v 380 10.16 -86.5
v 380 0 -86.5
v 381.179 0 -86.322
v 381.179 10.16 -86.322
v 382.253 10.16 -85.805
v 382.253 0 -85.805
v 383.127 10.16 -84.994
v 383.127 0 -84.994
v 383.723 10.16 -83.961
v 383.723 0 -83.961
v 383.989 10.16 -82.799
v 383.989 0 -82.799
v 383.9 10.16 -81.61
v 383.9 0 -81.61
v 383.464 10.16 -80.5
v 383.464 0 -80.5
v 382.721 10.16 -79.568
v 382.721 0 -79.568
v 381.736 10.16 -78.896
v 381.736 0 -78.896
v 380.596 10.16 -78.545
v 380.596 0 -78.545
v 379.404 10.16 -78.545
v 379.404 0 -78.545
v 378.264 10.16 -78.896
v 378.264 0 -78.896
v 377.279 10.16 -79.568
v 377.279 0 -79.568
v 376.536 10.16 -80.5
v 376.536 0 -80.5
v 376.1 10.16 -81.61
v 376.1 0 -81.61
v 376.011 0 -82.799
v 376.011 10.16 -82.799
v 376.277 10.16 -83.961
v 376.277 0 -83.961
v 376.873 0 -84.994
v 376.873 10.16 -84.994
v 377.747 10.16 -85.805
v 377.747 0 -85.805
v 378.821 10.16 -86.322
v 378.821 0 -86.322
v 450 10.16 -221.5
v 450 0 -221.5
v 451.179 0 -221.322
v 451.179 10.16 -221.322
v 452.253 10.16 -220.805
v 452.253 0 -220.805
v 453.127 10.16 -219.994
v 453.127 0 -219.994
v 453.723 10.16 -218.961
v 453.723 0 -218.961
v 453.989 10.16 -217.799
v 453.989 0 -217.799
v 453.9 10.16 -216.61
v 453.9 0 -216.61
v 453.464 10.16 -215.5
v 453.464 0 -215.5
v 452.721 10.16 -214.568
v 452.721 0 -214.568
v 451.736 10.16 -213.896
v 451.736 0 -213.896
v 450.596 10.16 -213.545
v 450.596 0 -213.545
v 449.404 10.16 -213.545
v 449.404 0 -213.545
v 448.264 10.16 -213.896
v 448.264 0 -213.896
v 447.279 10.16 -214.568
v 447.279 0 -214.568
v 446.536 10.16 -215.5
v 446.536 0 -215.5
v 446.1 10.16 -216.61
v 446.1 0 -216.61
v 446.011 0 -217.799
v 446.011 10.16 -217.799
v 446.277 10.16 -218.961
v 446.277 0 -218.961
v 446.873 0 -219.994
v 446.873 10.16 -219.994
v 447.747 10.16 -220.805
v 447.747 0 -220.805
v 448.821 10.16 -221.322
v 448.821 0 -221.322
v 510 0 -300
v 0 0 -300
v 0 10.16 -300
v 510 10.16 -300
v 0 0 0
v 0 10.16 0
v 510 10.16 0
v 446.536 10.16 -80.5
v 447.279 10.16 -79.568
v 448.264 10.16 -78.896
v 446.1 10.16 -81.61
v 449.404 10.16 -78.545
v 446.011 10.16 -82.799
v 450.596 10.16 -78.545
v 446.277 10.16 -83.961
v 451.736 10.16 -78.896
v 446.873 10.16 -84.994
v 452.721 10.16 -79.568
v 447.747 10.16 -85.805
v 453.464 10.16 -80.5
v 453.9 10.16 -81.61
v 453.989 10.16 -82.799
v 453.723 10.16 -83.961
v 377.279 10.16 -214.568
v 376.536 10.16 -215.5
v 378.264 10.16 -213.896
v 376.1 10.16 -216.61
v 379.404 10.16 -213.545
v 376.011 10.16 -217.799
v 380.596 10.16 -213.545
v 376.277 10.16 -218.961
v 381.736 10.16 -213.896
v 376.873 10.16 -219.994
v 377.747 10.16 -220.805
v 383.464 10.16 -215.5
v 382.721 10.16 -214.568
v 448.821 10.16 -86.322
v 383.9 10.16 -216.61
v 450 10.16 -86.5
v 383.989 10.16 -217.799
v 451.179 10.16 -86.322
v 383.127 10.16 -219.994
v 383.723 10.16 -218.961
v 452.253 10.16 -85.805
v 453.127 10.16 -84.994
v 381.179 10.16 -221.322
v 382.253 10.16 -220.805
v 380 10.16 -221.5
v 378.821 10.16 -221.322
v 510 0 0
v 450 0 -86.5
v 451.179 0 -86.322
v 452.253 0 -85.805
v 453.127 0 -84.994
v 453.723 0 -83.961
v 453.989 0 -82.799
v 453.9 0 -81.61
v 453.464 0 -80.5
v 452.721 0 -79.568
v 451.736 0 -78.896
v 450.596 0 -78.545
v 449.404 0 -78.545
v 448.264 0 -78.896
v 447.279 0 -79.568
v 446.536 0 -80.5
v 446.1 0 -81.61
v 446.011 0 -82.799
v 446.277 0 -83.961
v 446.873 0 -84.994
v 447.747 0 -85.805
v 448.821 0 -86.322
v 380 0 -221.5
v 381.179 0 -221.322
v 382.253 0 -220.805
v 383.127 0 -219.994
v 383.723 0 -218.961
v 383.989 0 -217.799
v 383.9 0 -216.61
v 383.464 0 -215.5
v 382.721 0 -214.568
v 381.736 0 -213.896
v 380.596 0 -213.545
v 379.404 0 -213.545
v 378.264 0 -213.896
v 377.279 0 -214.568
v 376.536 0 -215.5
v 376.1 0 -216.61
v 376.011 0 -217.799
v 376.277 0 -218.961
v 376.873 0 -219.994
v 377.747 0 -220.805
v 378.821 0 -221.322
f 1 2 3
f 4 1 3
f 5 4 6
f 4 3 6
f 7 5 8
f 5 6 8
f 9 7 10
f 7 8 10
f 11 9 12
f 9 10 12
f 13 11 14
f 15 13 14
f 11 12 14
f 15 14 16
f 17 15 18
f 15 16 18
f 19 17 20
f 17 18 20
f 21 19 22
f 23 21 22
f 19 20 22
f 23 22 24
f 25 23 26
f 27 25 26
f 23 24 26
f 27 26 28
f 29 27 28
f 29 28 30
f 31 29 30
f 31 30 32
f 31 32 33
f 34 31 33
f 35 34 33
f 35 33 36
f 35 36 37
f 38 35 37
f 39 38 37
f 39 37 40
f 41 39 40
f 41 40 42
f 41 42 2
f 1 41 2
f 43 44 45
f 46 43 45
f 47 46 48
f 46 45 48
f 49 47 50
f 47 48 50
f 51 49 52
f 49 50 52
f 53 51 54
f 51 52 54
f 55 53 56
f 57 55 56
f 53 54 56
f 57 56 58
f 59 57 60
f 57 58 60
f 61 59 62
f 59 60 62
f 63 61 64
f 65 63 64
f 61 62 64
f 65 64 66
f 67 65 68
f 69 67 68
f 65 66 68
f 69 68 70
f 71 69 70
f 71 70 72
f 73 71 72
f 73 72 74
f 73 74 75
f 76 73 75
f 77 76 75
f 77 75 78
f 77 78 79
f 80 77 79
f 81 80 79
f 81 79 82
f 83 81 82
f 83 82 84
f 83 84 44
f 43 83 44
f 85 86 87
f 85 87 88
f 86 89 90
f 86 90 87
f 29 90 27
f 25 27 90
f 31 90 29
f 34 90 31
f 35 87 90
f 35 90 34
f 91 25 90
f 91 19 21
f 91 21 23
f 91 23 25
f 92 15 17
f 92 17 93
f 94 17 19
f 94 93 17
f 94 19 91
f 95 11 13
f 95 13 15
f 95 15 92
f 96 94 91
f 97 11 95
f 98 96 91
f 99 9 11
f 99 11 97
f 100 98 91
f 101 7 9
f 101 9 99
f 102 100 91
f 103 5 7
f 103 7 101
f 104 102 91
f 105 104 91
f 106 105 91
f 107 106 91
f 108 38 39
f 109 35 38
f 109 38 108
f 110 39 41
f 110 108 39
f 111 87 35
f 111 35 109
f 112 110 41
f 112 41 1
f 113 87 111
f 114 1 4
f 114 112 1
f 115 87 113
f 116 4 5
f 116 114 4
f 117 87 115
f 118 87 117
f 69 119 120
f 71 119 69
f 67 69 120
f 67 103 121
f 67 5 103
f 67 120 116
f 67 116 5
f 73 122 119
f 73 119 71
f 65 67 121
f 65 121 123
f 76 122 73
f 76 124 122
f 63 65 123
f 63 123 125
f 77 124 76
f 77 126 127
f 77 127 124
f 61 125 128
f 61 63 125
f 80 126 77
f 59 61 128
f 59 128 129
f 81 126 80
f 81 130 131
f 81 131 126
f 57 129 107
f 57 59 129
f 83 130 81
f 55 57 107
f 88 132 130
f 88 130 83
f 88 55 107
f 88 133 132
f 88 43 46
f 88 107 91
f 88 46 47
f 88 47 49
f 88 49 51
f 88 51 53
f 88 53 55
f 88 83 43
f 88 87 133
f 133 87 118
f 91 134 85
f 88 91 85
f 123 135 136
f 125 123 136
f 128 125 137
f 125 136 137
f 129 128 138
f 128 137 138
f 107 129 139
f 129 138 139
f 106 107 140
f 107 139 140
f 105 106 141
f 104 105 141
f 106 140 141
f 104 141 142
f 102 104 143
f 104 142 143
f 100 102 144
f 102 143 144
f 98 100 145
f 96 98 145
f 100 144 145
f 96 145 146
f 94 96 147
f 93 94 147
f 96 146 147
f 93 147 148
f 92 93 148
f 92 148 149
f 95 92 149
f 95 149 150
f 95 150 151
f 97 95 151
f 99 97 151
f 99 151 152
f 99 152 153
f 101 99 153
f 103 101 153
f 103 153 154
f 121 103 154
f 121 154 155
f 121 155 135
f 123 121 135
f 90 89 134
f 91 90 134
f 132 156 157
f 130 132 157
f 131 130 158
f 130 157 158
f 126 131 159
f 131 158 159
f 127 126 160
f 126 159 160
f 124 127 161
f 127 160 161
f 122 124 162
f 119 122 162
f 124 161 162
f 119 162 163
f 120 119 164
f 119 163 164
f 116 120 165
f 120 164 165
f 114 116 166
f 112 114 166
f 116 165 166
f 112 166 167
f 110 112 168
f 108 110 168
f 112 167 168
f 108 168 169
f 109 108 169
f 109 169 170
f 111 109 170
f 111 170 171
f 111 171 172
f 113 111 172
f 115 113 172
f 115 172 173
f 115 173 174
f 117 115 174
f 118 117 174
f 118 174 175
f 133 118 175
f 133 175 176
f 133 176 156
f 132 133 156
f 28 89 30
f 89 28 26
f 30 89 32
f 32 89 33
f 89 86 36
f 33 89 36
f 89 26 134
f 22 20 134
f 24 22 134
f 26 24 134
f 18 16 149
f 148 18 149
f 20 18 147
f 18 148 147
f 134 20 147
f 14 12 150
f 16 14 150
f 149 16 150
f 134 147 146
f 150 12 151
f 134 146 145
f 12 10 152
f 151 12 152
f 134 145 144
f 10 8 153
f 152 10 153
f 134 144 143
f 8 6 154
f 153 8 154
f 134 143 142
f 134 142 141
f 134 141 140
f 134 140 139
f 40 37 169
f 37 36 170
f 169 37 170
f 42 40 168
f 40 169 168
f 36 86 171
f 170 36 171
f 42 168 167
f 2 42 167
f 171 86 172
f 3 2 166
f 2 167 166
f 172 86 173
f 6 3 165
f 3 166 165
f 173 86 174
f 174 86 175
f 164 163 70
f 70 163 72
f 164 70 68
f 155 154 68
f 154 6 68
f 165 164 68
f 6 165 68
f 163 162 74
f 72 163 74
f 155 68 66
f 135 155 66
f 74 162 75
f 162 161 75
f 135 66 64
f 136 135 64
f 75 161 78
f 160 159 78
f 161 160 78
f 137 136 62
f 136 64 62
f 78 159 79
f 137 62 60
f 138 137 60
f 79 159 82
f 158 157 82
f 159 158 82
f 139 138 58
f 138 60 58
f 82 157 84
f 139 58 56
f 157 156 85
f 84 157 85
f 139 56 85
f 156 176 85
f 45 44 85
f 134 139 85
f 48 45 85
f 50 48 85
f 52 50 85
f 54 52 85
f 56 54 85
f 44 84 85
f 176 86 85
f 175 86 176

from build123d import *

# Parameters (mm, degrees)
SKETCH1_W           = 510
SKETCH1_H           = 300
BOSS_EXTRUDE1_DEPTH = 10.16
SKETCH2_R           = 4
CUT_EXTRUDE1_DEPTH  = 592.779710365


with BuildPart() as part:
    # Sketch1 → Boss-Extrude1 (new body)
    with BuildSketch(Plane(origin=(0, 0, 0), x_dir=(1, 0, 0), z_dir=(0, 1, 0))):
        with Locations((255, 150)):
            Rectangle(SKETCH1_W, SKETCH1_H)
    extrude(amount=BOSS_EXTRUDE1_DEPTH)

    # Sketch2 → Cut-Extrude1 (cut, through all)
    with BuildSketch(Plane.XZ):
        with Locations(Location((380, -217.5, 0), (0, 0, 270))):
            Circle(SKETCH2_R)
        with Locations(Location((380, -82.5, 0), (0, 0, 270))):
            Circle(SKETCH2_R)
        with Locations(Location((450, -82.5, 0), (0, 0, 270))):
            Circle(SKETCH2_R)
        with Locations(Location((450, -217.5, 0), (0, 0, 270))):
            Circle(SKETCH2_R)
    extrude(amount=-CUT_EXTRUDE1_DEPTH, mode=Mode.SUBTRACT)


solid = part.part
